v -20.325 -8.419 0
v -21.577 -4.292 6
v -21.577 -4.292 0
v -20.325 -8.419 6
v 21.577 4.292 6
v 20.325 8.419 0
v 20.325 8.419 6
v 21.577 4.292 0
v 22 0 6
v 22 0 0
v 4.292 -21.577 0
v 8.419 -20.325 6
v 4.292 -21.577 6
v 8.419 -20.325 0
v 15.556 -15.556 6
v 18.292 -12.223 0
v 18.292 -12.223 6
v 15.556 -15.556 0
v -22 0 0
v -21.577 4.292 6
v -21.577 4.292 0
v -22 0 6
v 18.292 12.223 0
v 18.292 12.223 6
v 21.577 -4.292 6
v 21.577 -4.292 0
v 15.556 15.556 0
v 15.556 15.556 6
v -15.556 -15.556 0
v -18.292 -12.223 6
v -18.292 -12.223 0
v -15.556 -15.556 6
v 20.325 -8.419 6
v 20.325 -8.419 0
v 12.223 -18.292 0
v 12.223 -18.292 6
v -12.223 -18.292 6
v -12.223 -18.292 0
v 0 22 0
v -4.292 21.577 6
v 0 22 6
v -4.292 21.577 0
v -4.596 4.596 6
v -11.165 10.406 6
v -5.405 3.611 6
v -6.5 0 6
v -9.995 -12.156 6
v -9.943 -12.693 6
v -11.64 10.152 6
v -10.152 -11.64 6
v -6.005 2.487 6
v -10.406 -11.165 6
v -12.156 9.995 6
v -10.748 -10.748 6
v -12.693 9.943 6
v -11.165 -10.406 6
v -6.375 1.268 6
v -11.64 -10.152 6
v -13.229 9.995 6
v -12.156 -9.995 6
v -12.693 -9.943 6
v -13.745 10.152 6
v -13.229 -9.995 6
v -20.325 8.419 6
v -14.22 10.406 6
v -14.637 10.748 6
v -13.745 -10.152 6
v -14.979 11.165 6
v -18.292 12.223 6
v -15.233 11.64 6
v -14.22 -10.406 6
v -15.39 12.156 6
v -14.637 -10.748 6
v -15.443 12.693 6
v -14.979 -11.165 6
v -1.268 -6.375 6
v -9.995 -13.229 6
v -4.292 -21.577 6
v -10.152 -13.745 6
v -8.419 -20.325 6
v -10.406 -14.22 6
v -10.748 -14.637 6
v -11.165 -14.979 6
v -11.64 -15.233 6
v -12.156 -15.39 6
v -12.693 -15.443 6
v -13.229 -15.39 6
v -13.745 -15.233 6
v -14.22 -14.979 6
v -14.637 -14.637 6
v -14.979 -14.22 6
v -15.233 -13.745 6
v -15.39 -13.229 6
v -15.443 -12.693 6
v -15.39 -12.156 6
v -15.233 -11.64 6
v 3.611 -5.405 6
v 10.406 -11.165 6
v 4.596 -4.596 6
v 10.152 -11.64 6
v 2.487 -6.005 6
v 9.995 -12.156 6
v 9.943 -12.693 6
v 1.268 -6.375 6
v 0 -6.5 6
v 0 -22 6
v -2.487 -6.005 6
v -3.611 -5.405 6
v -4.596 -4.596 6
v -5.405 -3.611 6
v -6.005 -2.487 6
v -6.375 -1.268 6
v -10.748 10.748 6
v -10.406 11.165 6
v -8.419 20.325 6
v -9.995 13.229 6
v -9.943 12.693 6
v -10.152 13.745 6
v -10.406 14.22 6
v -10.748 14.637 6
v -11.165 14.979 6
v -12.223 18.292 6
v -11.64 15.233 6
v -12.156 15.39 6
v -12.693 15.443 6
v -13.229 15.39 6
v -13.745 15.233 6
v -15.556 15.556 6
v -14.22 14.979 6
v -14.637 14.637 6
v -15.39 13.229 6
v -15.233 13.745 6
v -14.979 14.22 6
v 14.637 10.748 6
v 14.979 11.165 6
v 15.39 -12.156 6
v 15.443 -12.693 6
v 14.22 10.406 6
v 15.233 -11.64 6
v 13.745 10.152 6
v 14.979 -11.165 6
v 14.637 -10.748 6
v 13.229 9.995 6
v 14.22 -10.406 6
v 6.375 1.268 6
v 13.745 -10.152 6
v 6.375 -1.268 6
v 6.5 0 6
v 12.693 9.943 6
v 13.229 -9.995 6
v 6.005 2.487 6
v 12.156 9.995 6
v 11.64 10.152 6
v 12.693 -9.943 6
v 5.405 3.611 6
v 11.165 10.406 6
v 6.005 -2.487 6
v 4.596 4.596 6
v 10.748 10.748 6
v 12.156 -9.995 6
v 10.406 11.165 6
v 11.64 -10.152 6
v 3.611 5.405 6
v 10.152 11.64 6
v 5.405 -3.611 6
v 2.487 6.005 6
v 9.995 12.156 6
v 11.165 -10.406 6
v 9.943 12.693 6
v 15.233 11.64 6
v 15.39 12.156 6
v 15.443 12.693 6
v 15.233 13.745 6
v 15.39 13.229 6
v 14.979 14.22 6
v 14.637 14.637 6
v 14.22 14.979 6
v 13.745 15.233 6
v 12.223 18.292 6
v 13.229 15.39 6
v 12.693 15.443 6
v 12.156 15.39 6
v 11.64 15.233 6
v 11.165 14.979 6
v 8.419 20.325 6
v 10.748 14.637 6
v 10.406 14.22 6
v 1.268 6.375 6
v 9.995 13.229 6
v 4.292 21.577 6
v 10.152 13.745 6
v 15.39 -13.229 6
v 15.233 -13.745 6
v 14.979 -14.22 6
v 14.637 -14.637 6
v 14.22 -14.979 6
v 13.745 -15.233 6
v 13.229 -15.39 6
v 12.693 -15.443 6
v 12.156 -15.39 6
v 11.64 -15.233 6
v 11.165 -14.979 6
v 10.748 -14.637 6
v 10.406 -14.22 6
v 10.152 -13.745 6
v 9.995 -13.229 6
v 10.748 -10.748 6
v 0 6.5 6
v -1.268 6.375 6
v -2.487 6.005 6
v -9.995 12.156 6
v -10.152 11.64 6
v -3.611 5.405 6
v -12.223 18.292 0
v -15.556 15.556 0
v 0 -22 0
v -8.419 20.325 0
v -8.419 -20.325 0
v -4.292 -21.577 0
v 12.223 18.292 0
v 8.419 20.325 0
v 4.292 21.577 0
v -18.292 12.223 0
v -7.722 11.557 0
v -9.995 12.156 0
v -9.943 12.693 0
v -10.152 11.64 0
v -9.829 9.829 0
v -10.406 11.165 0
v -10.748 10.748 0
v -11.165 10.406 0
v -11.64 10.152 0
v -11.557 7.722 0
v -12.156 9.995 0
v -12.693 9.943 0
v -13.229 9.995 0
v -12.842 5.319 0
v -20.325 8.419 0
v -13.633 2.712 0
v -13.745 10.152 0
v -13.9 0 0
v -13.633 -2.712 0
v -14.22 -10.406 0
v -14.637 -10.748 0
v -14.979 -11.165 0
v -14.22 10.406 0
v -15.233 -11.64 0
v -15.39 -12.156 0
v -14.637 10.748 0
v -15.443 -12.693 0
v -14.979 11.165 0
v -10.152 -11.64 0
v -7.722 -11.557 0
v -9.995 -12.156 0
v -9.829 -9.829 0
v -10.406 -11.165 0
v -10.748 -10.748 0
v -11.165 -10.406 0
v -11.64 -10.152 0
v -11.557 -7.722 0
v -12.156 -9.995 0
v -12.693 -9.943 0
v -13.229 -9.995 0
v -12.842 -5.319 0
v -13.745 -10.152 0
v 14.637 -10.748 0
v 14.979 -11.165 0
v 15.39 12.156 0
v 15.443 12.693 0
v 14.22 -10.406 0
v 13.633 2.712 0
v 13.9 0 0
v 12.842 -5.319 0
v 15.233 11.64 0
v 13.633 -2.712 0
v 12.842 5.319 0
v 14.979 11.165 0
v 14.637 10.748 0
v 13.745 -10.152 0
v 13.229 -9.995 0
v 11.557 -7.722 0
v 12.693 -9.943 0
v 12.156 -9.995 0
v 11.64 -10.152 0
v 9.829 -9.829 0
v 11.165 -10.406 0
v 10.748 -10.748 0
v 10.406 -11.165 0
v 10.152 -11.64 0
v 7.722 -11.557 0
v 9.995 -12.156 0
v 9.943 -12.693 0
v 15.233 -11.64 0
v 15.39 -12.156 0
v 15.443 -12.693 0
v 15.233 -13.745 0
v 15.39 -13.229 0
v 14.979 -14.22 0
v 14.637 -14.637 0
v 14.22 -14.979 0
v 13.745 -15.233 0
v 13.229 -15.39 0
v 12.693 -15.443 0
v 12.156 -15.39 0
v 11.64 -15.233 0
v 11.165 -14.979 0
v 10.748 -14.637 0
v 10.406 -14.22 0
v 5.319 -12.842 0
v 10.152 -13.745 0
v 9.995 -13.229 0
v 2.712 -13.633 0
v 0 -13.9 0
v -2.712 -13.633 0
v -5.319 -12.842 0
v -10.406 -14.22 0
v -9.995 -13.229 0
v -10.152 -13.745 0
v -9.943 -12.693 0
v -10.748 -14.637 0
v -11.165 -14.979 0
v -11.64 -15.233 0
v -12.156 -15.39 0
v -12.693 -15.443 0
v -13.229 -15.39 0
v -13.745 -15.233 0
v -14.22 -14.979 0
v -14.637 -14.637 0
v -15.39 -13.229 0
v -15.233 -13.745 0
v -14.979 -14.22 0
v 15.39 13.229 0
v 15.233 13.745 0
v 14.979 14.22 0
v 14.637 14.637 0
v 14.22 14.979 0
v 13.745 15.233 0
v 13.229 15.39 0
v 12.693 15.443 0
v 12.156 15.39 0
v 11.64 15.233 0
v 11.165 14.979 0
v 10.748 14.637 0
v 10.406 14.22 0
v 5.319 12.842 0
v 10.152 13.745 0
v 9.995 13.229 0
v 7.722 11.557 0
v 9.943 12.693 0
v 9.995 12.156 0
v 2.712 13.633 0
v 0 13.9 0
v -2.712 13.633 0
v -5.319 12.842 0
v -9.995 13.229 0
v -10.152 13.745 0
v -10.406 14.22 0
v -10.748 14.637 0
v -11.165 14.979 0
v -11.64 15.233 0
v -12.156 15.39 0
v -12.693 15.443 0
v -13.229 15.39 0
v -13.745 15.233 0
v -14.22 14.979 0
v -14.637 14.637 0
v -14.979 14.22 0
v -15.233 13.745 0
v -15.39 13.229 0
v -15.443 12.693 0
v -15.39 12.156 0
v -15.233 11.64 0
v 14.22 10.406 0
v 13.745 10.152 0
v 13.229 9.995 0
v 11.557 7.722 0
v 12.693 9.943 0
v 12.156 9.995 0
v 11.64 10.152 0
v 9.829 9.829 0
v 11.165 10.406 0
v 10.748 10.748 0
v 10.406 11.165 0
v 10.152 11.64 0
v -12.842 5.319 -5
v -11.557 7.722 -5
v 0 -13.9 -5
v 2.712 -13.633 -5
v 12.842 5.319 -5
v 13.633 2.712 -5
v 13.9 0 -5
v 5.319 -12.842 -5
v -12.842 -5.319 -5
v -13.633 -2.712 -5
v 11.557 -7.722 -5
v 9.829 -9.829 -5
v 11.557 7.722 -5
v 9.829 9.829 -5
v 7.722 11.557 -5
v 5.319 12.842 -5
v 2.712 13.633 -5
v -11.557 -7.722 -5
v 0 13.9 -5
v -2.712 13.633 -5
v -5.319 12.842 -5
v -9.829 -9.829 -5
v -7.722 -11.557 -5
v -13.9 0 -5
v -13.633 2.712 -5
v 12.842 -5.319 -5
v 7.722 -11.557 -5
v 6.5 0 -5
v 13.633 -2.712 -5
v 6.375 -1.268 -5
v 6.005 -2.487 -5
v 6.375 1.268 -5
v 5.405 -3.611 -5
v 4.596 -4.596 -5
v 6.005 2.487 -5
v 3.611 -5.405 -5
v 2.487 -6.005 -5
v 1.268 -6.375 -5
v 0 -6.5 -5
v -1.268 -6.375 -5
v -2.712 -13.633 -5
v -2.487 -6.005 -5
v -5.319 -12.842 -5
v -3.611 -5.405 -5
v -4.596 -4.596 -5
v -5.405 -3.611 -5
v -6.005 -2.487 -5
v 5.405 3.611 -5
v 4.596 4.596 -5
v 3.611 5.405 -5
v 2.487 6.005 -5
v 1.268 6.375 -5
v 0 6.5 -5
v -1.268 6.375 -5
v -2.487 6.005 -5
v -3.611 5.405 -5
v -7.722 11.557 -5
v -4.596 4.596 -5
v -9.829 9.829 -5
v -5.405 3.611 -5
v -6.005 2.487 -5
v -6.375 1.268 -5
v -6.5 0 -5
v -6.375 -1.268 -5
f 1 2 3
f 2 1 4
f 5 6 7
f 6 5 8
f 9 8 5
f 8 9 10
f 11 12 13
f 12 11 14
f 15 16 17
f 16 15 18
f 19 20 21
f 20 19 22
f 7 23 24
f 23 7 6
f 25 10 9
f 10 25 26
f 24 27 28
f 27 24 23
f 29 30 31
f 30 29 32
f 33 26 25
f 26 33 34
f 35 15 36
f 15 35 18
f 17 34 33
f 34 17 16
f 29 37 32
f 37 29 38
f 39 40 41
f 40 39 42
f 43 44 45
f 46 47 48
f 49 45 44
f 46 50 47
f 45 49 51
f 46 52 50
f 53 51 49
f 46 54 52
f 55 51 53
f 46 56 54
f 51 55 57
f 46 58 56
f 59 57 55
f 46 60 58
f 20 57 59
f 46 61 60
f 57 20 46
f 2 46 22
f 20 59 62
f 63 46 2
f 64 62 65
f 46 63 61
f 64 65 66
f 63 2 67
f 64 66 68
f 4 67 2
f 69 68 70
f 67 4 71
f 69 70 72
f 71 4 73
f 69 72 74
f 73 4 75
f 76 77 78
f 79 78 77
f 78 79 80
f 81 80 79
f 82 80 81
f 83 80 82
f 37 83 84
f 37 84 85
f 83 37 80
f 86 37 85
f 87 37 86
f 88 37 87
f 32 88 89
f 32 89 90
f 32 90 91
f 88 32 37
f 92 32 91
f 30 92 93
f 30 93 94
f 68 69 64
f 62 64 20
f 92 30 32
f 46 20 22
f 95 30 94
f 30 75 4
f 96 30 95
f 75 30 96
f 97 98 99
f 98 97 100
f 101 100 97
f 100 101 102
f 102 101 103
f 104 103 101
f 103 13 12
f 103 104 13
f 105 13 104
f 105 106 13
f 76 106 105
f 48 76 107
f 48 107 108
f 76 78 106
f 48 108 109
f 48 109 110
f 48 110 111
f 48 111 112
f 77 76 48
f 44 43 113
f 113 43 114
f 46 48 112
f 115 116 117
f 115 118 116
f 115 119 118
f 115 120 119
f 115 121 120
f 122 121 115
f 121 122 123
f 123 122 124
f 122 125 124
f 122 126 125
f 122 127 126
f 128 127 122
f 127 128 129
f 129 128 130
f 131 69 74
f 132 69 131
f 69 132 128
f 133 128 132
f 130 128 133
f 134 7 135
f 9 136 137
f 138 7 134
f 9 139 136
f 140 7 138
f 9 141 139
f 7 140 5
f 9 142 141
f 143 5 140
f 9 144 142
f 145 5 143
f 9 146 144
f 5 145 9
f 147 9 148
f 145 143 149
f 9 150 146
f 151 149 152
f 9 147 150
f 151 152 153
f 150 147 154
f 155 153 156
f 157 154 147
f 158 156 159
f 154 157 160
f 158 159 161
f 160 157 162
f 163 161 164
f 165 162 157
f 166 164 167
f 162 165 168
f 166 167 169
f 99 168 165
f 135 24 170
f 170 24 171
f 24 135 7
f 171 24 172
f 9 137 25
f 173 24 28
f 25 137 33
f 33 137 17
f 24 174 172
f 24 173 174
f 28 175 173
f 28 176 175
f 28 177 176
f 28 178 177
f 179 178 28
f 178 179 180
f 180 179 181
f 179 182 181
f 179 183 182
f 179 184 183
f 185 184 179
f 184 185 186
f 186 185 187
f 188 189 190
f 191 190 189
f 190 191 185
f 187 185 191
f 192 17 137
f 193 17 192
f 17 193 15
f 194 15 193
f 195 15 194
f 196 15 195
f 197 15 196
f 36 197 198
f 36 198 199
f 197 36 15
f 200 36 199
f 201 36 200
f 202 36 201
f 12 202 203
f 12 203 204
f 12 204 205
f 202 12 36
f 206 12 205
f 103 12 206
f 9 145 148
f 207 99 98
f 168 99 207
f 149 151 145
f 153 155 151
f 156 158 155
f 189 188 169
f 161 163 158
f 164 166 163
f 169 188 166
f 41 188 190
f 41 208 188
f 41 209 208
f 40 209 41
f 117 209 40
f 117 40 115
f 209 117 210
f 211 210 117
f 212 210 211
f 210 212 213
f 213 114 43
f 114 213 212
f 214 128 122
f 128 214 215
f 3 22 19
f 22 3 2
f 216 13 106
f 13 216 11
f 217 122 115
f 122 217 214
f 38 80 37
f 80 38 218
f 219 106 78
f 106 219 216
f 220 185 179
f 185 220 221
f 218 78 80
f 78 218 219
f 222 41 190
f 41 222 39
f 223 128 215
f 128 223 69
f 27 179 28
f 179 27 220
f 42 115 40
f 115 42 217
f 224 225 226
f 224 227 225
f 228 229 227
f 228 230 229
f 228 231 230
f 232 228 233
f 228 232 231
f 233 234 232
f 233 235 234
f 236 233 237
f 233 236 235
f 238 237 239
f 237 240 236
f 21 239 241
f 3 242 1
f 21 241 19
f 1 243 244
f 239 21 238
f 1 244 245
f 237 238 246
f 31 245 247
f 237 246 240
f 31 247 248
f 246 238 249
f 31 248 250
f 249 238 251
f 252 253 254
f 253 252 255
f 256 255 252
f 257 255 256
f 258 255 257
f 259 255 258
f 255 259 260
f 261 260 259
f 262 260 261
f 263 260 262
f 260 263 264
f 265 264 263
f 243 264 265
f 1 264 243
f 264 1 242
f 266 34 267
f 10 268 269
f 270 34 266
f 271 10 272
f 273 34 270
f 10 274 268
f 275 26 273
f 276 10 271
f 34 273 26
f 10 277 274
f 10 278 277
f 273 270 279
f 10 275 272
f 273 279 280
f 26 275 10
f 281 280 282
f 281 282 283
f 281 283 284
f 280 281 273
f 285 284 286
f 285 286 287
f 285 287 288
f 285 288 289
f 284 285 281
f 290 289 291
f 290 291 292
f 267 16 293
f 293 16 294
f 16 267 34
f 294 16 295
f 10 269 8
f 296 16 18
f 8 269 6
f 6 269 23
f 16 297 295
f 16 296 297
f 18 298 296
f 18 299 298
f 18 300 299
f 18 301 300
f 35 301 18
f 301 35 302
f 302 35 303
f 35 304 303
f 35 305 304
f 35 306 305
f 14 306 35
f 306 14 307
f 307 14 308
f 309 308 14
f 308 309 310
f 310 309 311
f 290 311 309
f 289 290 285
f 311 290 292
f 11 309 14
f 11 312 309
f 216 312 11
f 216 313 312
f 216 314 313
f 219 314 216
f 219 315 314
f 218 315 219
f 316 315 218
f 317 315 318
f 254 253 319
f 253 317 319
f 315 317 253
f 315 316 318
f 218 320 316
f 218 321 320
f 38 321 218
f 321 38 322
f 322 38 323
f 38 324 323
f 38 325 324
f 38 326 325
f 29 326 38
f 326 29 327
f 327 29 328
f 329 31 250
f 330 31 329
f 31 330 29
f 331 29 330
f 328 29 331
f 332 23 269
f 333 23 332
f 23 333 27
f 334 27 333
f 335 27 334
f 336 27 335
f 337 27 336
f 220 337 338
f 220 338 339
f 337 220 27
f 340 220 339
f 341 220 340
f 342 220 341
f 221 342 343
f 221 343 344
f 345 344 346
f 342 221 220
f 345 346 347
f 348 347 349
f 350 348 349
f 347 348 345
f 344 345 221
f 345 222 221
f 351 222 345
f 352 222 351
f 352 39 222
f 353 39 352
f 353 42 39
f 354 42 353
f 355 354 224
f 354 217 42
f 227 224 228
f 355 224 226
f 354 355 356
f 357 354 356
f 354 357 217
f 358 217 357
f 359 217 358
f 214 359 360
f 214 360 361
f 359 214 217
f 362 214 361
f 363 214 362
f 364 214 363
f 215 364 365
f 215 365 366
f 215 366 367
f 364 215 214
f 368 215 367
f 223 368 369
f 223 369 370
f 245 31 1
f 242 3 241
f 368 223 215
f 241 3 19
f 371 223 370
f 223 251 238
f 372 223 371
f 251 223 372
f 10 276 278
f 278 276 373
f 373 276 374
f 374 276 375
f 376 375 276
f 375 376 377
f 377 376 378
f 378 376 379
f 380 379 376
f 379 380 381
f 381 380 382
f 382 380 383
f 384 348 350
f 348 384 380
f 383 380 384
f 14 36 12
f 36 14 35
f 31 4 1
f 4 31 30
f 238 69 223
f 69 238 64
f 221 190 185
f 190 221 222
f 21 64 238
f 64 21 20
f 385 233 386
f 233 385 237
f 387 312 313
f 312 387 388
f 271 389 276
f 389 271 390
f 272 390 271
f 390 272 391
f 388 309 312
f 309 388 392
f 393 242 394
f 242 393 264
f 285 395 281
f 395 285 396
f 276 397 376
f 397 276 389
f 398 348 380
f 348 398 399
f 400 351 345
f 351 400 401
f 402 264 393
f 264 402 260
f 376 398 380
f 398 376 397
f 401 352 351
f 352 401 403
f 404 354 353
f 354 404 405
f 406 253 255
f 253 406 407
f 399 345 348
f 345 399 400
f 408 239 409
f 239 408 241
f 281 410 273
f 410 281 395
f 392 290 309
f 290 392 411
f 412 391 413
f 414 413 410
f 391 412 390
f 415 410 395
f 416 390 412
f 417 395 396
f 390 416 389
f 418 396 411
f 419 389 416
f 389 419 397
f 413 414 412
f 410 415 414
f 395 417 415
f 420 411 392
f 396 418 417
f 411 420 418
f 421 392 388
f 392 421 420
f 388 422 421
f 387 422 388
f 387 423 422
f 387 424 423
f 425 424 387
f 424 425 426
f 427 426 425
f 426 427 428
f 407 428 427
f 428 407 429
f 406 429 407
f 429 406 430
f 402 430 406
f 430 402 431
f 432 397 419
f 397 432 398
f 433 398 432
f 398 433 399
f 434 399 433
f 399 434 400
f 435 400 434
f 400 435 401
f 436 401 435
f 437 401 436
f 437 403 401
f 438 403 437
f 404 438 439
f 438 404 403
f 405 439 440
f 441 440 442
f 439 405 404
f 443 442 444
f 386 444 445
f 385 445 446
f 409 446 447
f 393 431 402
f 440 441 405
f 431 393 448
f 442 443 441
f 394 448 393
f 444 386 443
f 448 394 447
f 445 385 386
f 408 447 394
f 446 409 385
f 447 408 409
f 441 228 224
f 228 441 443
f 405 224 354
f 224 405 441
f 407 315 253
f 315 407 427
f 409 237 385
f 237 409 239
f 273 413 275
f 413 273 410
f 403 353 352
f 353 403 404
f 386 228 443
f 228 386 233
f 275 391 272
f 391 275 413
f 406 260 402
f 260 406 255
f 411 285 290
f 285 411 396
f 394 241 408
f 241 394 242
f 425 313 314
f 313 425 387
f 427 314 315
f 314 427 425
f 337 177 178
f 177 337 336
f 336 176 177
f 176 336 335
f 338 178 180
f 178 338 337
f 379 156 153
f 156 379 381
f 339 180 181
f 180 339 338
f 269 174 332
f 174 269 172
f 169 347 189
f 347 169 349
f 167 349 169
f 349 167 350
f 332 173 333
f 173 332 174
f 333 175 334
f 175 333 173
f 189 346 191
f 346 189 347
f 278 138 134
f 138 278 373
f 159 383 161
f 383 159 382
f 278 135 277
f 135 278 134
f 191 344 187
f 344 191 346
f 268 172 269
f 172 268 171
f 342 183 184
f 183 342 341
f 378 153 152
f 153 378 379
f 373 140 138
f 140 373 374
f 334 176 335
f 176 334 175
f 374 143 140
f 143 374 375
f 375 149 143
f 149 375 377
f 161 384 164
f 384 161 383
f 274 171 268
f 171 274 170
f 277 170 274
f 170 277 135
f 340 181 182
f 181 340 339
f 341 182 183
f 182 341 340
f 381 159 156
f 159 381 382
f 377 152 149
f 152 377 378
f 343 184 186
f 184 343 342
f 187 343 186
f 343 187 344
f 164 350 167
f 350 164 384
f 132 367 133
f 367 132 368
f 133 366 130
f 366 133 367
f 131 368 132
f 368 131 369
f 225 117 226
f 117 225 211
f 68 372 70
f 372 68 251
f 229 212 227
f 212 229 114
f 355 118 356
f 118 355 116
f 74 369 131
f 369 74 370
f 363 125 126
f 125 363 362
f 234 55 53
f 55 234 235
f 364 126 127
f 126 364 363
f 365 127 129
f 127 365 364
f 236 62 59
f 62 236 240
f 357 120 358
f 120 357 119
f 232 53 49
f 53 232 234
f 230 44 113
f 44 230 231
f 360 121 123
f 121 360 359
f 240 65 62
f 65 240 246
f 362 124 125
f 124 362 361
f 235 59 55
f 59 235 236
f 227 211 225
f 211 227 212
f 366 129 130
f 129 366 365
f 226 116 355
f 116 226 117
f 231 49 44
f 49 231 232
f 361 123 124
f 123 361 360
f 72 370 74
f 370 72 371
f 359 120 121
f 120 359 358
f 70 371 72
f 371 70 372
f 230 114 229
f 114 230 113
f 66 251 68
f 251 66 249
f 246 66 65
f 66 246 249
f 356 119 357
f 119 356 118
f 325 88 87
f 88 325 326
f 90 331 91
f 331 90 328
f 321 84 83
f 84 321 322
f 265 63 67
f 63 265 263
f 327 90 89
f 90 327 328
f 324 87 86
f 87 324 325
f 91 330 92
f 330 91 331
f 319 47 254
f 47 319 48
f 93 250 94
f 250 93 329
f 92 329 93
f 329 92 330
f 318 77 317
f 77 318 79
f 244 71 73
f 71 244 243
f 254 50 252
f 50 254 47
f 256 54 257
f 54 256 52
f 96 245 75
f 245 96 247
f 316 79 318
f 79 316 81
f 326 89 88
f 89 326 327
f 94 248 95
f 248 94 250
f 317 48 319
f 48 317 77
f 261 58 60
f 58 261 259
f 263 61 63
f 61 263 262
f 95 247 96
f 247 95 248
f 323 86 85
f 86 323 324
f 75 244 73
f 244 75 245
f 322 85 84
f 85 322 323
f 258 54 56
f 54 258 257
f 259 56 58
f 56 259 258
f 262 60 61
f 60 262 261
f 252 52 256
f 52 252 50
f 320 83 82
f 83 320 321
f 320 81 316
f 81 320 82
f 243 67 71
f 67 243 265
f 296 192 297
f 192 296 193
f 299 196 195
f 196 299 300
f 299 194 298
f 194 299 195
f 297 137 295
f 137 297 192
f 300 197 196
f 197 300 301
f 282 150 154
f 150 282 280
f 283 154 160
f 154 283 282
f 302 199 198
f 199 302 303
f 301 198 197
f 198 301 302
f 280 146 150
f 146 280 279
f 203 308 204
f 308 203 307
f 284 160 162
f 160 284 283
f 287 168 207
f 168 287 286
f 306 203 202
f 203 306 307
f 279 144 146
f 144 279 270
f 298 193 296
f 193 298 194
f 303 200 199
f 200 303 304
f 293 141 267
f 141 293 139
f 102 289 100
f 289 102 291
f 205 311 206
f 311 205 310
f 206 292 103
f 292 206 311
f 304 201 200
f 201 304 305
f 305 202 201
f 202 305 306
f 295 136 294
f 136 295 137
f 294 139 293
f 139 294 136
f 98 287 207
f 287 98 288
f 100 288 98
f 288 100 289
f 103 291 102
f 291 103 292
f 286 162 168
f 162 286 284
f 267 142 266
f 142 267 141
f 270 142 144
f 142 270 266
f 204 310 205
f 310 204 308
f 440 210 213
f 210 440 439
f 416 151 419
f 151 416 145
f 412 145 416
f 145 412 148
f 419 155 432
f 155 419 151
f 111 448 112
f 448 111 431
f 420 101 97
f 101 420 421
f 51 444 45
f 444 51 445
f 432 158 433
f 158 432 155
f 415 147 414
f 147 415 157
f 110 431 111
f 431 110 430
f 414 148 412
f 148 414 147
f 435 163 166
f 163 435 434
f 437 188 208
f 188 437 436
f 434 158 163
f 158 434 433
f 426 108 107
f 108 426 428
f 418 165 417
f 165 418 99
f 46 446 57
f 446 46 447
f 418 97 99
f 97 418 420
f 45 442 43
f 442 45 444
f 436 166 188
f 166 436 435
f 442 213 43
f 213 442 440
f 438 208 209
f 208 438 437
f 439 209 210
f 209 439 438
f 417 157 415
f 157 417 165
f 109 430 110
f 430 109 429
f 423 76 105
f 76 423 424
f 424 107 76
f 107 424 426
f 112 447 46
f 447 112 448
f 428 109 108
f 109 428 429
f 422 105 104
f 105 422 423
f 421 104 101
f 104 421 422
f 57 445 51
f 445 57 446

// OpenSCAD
$fn = 32;

// ----------------------------------------------------------------------
// Retaining cap: 6001 cover, 44 mm, spigot 27.8 mm
// ----------------------------------------------------------------------

// --- parameters (mm) ---
cap_d = 44;               // cover diameter
cap_t = 6;                // cover thickness
lip_d = 27.8;             // spigot that enters the housing
lip_h = 5;                // spigot height
shaft_d = 13;             // shaft opening
bolt_d = 5.5;             // bolt clearance
bolt_r = 17.95;           // bolt circle radius

module cover() {
  cylinder(h = cap_t, d = cap_d);
}

module spigot() {
  /* sunk 1 mm into the cover; the spigot sets the overall height */
  translate([0, 0, -lip_h]) cylinder(h = lip_h + 1, d = lip_d);
}

difference() {
  union() {
    cover();
    spigot();
  }
  for (i = [0 : 3]) rotate([0, 0, 45 + i * 90]) translate([bolt_r, 0, -lip_h - 1])
    cylinder(h = lip_h + cap_t + 2, d = bolt_d);
  translate([0, 0, -lip_h - 1]) cylinder(h = lip_h + cap_t + 2, d = shaft_d);
}
